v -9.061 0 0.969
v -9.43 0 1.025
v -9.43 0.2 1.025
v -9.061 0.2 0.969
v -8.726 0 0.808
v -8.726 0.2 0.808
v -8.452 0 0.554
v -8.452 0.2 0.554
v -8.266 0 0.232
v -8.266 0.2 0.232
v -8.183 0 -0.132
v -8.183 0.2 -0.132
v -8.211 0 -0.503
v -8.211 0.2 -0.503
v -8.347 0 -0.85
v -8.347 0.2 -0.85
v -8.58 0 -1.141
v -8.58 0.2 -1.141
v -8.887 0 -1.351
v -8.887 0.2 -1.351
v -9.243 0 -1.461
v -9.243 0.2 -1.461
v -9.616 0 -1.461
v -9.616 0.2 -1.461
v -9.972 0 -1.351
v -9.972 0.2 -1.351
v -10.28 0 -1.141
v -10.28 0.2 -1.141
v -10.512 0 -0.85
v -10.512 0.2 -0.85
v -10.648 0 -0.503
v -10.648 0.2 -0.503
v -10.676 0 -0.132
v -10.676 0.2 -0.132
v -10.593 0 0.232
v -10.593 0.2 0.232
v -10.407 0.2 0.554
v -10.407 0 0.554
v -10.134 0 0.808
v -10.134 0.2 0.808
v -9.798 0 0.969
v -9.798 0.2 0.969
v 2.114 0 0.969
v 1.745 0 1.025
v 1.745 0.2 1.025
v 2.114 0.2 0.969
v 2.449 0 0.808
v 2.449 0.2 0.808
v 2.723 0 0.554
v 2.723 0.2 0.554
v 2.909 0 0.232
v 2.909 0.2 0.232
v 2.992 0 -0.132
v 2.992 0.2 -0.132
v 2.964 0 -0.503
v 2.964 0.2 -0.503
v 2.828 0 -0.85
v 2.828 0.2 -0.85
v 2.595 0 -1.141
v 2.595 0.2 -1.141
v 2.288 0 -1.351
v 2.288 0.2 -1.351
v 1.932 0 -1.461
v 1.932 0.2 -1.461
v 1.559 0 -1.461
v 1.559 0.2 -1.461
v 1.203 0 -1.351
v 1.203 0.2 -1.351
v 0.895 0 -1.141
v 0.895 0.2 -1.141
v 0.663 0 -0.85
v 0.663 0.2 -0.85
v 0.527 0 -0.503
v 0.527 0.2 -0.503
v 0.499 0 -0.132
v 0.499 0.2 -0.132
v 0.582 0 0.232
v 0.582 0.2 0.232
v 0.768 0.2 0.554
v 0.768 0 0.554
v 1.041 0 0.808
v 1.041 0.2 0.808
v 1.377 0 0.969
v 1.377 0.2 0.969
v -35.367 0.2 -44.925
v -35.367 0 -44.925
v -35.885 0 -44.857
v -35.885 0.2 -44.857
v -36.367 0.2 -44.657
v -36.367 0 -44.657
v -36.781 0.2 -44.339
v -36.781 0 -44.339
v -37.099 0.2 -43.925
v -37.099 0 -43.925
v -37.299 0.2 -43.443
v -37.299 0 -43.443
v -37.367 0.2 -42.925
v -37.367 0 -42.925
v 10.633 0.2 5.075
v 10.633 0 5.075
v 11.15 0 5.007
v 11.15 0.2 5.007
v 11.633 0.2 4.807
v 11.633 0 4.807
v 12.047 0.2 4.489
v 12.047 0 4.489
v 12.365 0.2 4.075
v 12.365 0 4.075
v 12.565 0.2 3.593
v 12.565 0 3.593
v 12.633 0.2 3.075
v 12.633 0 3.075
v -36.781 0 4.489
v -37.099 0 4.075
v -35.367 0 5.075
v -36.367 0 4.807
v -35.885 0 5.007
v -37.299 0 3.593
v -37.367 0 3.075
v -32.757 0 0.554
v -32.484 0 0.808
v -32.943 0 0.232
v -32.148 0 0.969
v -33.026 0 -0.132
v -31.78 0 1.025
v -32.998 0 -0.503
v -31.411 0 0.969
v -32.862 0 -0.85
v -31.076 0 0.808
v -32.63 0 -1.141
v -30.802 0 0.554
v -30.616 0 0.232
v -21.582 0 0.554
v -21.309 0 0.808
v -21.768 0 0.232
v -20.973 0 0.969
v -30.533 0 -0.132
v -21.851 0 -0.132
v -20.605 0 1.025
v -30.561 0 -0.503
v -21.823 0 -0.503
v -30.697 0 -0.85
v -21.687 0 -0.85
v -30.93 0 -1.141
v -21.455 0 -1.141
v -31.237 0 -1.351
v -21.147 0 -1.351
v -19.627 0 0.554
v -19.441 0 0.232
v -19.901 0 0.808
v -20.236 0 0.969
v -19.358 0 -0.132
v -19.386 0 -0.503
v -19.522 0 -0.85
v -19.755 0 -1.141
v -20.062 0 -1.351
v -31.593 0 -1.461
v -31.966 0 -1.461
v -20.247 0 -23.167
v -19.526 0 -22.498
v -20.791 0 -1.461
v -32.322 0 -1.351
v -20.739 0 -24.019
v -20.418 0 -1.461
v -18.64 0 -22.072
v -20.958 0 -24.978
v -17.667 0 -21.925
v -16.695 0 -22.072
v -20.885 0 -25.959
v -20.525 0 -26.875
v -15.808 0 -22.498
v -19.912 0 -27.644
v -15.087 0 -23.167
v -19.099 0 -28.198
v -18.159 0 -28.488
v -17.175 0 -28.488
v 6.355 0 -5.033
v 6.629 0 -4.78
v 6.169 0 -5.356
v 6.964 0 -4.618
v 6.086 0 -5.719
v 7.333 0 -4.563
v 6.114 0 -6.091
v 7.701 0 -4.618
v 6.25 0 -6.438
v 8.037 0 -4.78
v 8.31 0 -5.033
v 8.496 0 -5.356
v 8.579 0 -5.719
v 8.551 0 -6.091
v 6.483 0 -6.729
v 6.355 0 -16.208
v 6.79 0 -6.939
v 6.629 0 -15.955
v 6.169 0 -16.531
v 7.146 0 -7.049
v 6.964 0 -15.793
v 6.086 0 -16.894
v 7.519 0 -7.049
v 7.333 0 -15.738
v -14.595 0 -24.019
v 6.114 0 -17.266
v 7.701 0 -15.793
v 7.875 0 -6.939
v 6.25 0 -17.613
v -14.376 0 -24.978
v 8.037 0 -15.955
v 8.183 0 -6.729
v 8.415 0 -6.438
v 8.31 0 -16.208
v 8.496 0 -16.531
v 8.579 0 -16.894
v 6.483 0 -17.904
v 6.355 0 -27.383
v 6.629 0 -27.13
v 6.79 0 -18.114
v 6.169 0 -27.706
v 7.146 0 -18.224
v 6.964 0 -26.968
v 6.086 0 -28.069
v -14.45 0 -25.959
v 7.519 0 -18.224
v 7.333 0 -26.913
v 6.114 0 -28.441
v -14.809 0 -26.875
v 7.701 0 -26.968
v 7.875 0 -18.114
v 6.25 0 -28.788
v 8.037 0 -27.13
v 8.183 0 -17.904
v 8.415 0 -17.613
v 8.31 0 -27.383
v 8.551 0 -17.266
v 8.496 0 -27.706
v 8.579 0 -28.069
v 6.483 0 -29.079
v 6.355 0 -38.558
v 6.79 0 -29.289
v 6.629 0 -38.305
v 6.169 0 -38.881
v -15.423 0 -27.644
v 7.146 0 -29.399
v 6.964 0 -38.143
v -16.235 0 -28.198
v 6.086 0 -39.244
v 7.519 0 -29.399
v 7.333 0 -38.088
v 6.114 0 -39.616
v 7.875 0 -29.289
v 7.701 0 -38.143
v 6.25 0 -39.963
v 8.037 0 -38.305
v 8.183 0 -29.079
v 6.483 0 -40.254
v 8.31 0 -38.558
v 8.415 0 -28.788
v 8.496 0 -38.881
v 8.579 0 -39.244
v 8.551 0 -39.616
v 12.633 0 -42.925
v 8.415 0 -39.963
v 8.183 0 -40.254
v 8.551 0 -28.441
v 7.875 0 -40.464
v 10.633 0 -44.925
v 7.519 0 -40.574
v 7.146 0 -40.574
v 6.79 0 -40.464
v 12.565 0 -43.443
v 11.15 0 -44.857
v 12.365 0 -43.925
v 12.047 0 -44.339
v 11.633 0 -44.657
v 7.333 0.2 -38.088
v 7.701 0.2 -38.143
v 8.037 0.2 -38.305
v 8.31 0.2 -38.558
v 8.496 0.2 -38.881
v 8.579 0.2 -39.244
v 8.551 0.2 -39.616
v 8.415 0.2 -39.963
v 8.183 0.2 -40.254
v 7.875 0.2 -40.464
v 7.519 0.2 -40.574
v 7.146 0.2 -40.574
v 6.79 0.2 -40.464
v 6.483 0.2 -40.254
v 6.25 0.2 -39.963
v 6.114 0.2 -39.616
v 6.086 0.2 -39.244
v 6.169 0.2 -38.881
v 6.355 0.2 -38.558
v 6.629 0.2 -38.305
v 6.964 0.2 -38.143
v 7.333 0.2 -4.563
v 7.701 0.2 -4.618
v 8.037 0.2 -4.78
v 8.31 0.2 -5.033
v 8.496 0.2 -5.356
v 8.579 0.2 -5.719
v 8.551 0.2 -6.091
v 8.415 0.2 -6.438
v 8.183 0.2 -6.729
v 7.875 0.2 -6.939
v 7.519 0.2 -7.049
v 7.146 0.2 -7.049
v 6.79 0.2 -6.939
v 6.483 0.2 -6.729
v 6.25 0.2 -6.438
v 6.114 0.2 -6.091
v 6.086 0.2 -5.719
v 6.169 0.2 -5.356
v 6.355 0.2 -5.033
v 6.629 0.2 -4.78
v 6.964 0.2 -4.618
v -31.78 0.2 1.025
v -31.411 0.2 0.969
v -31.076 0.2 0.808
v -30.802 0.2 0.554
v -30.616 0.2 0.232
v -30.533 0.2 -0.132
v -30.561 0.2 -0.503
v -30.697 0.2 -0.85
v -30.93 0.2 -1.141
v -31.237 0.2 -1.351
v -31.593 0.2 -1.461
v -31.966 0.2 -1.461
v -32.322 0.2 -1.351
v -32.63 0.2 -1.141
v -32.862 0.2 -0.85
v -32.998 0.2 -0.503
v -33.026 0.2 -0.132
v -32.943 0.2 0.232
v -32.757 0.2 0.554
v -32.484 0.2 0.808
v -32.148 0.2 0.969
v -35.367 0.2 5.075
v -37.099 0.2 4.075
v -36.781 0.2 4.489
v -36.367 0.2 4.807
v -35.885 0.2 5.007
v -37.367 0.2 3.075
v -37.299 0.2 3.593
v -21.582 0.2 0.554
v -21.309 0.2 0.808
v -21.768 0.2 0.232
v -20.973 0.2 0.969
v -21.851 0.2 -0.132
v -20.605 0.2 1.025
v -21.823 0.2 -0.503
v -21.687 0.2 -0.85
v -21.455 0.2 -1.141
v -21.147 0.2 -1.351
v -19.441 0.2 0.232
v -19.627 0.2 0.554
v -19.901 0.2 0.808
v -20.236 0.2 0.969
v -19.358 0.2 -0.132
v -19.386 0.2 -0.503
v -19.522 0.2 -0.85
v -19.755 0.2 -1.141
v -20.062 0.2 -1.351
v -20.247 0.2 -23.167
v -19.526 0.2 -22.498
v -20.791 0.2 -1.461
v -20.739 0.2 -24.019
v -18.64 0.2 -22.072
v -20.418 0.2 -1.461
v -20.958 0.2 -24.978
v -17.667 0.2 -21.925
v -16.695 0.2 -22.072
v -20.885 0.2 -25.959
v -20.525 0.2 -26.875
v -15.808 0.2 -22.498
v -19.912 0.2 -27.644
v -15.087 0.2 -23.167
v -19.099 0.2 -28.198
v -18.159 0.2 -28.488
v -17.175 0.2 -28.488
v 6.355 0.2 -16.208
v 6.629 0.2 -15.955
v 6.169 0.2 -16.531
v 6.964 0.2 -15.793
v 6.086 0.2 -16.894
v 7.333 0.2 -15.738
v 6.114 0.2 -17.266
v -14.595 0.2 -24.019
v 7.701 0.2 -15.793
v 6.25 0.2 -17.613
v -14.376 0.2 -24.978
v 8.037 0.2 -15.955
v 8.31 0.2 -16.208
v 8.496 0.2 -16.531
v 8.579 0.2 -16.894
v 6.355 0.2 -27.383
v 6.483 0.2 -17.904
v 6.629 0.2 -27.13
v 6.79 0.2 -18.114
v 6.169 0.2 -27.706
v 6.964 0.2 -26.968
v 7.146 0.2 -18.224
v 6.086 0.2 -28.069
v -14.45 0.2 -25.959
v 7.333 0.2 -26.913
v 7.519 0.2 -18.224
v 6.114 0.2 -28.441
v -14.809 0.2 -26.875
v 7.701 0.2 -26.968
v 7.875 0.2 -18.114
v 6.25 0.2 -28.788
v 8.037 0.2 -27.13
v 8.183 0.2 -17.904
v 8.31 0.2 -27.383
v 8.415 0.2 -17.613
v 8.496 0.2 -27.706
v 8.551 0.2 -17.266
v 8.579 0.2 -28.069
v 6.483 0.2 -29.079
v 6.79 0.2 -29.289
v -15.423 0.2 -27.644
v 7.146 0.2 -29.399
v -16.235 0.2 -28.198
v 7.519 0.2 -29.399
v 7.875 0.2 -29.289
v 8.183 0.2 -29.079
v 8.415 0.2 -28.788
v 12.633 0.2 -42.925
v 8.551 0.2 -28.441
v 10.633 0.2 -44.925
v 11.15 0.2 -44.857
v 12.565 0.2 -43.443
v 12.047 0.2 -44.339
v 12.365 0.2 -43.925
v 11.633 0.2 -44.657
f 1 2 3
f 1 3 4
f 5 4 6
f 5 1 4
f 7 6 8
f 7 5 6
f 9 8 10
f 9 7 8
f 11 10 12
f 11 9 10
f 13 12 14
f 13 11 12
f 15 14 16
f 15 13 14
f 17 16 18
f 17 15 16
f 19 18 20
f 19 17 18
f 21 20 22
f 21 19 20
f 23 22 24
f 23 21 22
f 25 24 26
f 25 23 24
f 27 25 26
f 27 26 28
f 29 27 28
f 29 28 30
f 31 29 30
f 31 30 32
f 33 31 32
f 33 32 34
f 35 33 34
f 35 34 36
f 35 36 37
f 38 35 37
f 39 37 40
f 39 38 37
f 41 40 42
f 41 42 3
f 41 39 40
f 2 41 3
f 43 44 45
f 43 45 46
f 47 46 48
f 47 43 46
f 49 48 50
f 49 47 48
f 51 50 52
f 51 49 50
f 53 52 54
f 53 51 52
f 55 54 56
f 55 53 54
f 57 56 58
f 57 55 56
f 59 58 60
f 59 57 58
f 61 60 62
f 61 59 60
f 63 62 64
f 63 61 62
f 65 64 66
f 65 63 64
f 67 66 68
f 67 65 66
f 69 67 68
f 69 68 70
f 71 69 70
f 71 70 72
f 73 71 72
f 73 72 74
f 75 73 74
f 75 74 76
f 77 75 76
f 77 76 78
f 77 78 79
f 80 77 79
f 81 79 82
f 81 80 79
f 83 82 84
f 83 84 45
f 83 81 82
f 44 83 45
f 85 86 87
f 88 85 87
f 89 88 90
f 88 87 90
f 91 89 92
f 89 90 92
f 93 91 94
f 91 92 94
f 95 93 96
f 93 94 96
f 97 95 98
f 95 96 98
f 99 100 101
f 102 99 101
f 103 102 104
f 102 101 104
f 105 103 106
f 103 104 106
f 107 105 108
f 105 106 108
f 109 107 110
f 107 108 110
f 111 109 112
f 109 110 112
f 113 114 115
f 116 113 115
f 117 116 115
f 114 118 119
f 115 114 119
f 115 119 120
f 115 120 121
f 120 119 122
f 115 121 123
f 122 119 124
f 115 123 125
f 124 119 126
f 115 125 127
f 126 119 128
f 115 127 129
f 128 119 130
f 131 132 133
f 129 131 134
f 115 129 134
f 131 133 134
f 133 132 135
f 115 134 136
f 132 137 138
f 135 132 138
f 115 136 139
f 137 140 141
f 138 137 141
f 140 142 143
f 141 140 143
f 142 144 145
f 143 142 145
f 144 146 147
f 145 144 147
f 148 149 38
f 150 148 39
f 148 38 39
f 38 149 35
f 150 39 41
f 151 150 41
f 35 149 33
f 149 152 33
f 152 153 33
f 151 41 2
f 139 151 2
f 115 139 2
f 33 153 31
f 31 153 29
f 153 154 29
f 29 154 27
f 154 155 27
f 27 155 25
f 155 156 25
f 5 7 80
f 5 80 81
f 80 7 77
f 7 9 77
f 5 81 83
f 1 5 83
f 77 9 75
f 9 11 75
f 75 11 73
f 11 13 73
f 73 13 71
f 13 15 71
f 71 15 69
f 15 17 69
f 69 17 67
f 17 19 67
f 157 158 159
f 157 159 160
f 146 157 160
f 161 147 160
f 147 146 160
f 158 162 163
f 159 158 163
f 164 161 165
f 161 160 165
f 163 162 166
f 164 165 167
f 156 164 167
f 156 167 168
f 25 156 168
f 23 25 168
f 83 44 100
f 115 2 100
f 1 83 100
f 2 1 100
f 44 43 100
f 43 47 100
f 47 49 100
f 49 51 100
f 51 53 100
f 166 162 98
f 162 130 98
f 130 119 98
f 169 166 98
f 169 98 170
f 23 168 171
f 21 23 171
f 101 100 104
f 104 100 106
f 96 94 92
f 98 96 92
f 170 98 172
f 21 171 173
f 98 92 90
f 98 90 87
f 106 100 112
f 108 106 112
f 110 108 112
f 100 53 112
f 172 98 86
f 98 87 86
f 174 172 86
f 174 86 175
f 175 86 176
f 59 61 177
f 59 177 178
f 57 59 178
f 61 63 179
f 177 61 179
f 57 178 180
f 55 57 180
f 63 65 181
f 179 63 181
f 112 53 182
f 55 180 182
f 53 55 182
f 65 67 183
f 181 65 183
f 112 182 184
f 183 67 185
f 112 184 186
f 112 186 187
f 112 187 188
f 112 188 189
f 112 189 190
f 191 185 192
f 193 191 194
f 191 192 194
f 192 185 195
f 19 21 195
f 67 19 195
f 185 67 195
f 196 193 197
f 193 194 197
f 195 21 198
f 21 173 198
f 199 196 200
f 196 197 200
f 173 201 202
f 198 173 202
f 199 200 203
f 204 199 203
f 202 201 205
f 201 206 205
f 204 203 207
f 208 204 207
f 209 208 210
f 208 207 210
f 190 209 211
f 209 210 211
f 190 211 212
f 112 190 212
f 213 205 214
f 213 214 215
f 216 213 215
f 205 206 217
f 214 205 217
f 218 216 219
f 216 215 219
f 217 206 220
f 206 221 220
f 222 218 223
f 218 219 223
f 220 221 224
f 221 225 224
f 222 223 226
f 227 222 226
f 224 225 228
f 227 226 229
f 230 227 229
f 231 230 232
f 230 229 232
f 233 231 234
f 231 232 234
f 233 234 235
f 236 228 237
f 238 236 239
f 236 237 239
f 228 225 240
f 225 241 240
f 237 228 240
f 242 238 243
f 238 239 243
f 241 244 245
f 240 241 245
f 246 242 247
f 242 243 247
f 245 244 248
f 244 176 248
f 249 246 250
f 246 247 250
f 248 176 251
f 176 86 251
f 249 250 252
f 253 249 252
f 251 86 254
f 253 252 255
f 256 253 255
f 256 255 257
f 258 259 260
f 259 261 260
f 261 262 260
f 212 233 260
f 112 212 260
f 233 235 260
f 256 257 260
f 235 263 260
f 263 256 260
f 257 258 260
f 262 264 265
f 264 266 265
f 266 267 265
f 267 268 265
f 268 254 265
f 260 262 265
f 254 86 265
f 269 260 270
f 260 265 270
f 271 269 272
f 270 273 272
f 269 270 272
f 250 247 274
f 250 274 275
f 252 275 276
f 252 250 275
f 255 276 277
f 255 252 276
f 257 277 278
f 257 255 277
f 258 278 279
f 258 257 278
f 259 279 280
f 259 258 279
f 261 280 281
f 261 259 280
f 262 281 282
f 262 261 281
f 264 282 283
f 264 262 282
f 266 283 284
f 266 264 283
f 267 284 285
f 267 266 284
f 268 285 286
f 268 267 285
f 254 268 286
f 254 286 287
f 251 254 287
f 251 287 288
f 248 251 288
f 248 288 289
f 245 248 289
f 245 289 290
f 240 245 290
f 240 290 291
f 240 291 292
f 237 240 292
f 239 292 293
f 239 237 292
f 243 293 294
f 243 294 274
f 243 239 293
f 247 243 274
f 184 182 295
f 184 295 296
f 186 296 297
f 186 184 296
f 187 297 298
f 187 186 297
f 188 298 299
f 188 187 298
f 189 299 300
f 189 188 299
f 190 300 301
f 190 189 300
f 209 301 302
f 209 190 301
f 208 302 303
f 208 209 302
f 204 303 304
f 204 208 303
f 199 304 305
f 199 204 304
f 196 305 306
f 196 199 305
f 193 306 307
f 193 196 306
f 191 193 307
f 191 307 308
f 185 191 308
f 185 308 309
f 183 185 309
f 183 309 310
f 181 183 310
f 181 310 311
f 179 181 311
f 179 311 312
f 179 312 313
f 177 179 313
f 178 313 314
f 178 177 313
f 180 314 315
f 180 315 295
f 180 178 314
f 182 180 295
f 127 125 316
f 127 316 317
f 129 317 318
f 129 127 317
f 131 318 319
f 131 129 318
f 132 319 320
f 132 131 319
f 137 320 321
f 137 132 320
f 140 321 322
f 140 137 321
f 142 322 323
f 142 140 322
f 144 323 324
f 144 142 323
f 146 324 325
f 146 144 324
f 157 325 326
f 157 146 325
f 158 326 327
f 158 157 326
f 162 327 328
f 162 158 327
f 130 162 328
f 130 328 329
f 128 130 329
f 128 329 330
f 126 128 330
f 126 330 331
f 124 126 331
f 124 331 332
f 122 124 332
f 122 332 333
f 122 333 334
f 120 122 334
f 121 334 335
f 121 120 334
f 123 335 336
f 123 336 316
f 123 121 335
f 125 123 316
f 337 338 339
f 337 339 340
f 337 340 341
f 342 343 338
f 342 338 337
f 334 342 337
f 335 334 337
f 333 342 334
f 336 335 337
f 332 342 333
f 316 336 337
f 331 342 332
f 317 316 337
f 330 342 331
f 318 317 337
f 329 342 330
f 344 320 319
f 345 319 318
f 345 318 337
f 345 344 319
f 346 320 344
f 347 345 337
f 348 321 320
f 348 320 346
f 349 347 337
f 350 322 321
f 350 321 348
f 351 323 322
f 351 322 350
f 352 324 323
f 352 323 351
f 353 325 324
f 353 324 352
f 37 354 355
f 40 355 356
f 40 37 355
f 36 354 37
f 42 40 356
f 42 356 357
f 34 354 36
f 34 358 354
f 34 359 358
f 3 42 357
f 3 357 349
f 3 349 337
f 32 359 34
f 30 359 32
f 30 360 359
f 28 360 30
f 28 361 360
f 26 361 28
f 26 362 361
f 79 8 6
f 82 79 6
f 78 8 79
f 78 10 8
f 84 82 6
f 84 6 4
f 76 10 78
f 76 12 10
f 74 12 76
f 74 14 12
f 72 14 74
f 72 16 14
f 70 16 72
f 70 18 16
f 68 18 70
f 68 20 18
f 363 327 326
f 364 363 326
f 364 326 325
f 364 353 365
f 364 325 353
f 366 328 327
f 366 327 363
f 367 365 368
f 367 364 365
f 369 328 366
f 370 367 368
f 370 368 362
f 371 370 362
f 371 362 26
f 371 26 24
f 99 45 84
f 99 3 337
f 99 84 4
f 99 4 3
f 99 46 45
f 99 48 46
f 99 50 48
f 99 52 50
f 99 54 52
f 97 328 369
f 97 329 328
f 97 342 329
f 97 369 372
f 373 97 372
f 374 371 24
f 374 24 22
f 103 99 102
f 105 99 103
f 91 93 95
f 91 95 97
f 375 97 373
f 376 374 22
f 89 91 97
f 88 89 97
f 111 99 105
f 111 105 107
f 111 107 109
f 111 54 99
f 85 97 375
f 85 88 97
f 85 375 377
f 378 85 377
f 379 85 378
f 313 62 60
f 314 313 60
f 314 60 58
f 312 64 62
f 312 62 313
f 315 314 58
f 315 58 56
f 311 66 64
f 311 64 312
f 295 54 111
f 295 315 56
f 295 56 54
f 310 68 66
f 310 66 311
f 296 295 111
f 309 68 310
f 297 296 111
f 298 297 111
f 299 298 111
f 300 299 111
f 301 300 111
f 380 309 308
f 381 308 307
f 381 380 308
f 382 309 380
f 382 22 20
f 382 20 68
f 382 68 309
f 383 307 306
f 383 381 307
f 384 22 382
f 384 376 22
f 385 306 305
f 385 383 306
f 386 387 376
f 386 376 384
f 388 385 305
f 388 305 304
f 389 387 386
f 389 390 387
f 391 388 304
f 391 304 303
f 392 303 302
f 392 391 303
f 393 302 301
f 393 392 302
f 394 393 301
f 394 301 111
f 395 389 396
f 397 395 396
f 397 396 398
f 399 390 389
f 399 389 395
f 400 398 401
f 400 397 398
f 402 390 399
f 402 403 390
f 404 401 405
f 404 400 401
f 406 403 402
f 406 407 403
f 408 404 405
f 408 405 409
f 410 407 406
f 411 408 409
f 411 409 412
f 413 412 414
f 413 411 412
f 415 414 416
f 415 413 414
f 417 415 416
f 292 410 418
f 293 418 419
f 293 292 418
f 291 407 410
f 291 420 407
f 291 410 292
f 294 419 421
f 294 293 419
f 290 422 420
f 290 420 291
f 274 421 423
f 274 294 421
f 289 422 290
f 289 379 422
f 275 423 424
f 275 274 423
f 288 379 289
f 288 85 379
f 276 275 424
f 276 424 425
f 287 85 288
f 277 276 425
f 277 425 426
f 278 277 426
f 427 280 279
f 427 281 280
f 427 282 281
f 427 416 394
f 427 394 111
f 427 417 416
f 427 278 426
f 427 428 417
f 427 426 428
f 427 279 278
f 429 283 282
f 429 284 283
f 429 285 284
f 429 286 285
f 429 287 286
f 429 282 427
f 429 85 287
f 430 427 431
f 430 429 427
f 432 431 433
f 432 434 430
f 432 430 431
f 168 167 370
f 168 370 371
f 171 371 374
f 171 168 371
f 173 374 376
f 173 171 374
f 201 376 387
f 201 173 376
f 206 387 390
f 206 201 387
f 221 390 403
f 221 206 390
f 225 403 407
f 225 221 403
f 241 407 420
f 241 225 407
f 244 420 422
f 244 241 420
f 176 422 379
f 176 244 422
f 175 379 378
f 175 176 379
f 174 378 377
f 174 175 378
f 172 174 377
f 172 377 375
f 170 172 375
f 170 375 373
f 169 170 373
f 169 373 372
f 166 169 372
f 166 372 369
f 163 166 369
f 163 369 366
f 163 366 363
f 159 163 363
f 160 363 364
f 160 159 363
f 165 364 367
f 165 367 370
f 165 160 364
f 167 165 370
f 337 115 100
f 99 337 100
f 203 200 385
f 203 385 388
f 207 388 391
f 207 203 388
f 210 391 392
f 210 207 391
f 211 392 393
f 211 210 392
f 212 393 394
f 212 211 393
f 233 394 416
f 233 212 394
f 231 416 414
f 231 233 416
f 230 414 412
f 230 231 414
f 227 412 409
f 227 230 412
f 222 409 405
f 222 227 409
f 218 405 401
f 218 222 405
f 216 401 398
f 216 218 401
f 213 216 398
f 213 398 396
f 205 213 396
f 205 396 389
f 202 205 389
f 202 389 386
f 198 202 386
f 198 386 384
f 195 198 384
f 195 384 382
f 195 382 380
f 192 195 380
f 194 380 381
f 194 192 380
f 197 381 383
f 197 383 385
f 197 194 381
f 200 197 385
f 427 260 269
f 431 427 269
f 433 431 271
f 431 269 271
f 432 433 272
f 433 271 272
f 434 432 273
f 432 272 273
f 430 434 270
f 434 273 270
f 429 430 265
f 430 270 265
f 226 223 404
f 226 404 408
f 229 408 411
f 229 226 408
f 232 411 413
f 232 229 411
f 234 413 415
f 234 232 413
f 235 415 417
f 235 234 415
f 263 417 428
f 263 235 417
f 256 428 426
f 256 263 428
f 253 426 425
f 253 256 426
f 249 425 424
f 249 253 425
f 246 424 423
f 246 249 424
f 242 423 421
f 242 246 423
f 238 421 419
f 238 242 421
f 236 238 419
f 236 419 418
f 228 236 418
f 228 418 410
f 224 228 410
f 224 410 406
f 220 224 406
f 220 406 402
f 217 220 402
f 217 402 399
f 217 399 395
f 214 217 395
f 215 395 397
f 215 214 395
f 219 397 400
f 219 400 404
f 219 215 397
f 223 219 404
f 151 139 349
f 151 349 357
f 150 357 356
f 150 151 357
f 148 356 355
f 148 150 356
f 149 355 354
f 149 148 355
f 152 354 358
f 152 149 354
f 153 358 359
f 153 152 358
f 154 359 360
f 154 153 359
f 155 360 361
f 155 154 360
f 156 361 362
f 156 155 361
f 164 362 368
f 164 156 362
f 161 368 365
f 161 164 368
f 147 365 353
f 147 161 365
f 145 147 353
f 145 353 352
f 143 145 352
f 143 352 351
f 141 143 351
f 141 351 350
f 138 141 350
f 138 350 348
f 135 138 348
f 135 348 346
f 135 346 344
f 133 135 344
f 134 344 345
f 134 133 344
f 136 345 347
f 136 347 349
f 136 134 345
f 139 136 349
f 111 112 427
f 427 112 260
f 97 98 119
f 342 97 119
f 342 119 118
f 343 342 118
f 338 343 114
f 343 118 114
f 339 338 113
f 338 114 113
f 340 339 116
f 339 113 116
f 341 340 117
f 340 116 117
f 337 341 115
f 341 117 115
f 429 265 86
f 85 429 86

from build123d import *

# Parameters (mm, degrees)
SKETCH1_R           = 3.3
SKETCH1_R_2         = 1.25
BOSS_EXTRUDE1_DEPTH = 0.2


with BuildPart() as part:
    # Sketch1 → Boss-Extrude1 (new body)
    with BuildSketch(Plane(origin=(0, 0, 0), x_dir=(1, 0, 0), z_dir=(0, 1, 0))):
        with BuildLine():
            Line((-37.367243025, 42.925002652), (-37.367243025, -3.074997348))
            ThreePointArc((-37.367243025, -3.074997348), (-36.781456588, -4.48921091), (-35.367243025, -5.074997348))
            Line((-35.367243025, -5.074997348), (10.632756975, -5.074997348))
            ThreePointArc((10.632756975, -5.074997348), (12.046970537, -4.48921091), (12.632756975, -3.074997348))
            Line((12.632756975, -3.074997348), (12.632756975, 42.925002652))
            ThreePointArc((12.632756975, 42.925002652), (12.046970537, 44.339216214), (10.632756975, 44.925002652))
            Line((10.632756975, 44.925002652), (-35.367243025, 44.925002652))
            ThreePointArc((-35.367243025, 44.925002652), (-36.781456588, 44.339216214), (-37.367243025, 42.925002652))
        make_face()
        with Locations(Location((-17.667243025, 25.225002652, 0), (0, 0, 270))):
            Circle(SKETCH1_R, mode=Mode.SUBTRACT)
        with Locations(Location((7.332756975, 16.987502652, 0), (0, 0, 270))):
            Circle(SKETCH1_R_2, mode=Mode.SUBTRACT)
        with Locations(Location((7.332756975, 28.162502652, 0), (0, 0, 270))):
            Circle(SKETCH1_R_2, mode=Mode.SUBTRACT)
        with Locations(Location((7.332756975, 39.337502652, 0), (0, 0, 270))):
            Circle(SKETCH1_R_2, mode=Mode.SUBTRACT)
        with Locations(Location((7.332756975, 5.812502652, 0), (0, 0, 270))):
            Circle(SKETCH1_R_2, mode=Mode.SUBTRACT)
        with Locations(Location((1.745256975, 0.225002652, 0), (0, 0, 270))):
            Circle(SKETCH1_R_2, mode=Mode.SUBTRACT)
        with Locations(Location((-9.429743025, 0.225002652, 0), (0, 0, 270))):
            Circle(SKETCH1_R_2, mode=Mode.SUBTRACT)
        with Locations(Location((-20.604743025, 0.225002652, 0), (0, 0, 270))):
            Circle(SKETCH1_R_2, mode=Mode.SUBTRACT)
        with Locations(Location((-31.779743025, 0.225002652, 0), (0, 0, 270))):
            Circle(SKETCH1_R_2, mode=Mode.SUBTRACT)
    extrude(amount=BOSS_EXTRUDE1_DEPTH)


solid = part.part
